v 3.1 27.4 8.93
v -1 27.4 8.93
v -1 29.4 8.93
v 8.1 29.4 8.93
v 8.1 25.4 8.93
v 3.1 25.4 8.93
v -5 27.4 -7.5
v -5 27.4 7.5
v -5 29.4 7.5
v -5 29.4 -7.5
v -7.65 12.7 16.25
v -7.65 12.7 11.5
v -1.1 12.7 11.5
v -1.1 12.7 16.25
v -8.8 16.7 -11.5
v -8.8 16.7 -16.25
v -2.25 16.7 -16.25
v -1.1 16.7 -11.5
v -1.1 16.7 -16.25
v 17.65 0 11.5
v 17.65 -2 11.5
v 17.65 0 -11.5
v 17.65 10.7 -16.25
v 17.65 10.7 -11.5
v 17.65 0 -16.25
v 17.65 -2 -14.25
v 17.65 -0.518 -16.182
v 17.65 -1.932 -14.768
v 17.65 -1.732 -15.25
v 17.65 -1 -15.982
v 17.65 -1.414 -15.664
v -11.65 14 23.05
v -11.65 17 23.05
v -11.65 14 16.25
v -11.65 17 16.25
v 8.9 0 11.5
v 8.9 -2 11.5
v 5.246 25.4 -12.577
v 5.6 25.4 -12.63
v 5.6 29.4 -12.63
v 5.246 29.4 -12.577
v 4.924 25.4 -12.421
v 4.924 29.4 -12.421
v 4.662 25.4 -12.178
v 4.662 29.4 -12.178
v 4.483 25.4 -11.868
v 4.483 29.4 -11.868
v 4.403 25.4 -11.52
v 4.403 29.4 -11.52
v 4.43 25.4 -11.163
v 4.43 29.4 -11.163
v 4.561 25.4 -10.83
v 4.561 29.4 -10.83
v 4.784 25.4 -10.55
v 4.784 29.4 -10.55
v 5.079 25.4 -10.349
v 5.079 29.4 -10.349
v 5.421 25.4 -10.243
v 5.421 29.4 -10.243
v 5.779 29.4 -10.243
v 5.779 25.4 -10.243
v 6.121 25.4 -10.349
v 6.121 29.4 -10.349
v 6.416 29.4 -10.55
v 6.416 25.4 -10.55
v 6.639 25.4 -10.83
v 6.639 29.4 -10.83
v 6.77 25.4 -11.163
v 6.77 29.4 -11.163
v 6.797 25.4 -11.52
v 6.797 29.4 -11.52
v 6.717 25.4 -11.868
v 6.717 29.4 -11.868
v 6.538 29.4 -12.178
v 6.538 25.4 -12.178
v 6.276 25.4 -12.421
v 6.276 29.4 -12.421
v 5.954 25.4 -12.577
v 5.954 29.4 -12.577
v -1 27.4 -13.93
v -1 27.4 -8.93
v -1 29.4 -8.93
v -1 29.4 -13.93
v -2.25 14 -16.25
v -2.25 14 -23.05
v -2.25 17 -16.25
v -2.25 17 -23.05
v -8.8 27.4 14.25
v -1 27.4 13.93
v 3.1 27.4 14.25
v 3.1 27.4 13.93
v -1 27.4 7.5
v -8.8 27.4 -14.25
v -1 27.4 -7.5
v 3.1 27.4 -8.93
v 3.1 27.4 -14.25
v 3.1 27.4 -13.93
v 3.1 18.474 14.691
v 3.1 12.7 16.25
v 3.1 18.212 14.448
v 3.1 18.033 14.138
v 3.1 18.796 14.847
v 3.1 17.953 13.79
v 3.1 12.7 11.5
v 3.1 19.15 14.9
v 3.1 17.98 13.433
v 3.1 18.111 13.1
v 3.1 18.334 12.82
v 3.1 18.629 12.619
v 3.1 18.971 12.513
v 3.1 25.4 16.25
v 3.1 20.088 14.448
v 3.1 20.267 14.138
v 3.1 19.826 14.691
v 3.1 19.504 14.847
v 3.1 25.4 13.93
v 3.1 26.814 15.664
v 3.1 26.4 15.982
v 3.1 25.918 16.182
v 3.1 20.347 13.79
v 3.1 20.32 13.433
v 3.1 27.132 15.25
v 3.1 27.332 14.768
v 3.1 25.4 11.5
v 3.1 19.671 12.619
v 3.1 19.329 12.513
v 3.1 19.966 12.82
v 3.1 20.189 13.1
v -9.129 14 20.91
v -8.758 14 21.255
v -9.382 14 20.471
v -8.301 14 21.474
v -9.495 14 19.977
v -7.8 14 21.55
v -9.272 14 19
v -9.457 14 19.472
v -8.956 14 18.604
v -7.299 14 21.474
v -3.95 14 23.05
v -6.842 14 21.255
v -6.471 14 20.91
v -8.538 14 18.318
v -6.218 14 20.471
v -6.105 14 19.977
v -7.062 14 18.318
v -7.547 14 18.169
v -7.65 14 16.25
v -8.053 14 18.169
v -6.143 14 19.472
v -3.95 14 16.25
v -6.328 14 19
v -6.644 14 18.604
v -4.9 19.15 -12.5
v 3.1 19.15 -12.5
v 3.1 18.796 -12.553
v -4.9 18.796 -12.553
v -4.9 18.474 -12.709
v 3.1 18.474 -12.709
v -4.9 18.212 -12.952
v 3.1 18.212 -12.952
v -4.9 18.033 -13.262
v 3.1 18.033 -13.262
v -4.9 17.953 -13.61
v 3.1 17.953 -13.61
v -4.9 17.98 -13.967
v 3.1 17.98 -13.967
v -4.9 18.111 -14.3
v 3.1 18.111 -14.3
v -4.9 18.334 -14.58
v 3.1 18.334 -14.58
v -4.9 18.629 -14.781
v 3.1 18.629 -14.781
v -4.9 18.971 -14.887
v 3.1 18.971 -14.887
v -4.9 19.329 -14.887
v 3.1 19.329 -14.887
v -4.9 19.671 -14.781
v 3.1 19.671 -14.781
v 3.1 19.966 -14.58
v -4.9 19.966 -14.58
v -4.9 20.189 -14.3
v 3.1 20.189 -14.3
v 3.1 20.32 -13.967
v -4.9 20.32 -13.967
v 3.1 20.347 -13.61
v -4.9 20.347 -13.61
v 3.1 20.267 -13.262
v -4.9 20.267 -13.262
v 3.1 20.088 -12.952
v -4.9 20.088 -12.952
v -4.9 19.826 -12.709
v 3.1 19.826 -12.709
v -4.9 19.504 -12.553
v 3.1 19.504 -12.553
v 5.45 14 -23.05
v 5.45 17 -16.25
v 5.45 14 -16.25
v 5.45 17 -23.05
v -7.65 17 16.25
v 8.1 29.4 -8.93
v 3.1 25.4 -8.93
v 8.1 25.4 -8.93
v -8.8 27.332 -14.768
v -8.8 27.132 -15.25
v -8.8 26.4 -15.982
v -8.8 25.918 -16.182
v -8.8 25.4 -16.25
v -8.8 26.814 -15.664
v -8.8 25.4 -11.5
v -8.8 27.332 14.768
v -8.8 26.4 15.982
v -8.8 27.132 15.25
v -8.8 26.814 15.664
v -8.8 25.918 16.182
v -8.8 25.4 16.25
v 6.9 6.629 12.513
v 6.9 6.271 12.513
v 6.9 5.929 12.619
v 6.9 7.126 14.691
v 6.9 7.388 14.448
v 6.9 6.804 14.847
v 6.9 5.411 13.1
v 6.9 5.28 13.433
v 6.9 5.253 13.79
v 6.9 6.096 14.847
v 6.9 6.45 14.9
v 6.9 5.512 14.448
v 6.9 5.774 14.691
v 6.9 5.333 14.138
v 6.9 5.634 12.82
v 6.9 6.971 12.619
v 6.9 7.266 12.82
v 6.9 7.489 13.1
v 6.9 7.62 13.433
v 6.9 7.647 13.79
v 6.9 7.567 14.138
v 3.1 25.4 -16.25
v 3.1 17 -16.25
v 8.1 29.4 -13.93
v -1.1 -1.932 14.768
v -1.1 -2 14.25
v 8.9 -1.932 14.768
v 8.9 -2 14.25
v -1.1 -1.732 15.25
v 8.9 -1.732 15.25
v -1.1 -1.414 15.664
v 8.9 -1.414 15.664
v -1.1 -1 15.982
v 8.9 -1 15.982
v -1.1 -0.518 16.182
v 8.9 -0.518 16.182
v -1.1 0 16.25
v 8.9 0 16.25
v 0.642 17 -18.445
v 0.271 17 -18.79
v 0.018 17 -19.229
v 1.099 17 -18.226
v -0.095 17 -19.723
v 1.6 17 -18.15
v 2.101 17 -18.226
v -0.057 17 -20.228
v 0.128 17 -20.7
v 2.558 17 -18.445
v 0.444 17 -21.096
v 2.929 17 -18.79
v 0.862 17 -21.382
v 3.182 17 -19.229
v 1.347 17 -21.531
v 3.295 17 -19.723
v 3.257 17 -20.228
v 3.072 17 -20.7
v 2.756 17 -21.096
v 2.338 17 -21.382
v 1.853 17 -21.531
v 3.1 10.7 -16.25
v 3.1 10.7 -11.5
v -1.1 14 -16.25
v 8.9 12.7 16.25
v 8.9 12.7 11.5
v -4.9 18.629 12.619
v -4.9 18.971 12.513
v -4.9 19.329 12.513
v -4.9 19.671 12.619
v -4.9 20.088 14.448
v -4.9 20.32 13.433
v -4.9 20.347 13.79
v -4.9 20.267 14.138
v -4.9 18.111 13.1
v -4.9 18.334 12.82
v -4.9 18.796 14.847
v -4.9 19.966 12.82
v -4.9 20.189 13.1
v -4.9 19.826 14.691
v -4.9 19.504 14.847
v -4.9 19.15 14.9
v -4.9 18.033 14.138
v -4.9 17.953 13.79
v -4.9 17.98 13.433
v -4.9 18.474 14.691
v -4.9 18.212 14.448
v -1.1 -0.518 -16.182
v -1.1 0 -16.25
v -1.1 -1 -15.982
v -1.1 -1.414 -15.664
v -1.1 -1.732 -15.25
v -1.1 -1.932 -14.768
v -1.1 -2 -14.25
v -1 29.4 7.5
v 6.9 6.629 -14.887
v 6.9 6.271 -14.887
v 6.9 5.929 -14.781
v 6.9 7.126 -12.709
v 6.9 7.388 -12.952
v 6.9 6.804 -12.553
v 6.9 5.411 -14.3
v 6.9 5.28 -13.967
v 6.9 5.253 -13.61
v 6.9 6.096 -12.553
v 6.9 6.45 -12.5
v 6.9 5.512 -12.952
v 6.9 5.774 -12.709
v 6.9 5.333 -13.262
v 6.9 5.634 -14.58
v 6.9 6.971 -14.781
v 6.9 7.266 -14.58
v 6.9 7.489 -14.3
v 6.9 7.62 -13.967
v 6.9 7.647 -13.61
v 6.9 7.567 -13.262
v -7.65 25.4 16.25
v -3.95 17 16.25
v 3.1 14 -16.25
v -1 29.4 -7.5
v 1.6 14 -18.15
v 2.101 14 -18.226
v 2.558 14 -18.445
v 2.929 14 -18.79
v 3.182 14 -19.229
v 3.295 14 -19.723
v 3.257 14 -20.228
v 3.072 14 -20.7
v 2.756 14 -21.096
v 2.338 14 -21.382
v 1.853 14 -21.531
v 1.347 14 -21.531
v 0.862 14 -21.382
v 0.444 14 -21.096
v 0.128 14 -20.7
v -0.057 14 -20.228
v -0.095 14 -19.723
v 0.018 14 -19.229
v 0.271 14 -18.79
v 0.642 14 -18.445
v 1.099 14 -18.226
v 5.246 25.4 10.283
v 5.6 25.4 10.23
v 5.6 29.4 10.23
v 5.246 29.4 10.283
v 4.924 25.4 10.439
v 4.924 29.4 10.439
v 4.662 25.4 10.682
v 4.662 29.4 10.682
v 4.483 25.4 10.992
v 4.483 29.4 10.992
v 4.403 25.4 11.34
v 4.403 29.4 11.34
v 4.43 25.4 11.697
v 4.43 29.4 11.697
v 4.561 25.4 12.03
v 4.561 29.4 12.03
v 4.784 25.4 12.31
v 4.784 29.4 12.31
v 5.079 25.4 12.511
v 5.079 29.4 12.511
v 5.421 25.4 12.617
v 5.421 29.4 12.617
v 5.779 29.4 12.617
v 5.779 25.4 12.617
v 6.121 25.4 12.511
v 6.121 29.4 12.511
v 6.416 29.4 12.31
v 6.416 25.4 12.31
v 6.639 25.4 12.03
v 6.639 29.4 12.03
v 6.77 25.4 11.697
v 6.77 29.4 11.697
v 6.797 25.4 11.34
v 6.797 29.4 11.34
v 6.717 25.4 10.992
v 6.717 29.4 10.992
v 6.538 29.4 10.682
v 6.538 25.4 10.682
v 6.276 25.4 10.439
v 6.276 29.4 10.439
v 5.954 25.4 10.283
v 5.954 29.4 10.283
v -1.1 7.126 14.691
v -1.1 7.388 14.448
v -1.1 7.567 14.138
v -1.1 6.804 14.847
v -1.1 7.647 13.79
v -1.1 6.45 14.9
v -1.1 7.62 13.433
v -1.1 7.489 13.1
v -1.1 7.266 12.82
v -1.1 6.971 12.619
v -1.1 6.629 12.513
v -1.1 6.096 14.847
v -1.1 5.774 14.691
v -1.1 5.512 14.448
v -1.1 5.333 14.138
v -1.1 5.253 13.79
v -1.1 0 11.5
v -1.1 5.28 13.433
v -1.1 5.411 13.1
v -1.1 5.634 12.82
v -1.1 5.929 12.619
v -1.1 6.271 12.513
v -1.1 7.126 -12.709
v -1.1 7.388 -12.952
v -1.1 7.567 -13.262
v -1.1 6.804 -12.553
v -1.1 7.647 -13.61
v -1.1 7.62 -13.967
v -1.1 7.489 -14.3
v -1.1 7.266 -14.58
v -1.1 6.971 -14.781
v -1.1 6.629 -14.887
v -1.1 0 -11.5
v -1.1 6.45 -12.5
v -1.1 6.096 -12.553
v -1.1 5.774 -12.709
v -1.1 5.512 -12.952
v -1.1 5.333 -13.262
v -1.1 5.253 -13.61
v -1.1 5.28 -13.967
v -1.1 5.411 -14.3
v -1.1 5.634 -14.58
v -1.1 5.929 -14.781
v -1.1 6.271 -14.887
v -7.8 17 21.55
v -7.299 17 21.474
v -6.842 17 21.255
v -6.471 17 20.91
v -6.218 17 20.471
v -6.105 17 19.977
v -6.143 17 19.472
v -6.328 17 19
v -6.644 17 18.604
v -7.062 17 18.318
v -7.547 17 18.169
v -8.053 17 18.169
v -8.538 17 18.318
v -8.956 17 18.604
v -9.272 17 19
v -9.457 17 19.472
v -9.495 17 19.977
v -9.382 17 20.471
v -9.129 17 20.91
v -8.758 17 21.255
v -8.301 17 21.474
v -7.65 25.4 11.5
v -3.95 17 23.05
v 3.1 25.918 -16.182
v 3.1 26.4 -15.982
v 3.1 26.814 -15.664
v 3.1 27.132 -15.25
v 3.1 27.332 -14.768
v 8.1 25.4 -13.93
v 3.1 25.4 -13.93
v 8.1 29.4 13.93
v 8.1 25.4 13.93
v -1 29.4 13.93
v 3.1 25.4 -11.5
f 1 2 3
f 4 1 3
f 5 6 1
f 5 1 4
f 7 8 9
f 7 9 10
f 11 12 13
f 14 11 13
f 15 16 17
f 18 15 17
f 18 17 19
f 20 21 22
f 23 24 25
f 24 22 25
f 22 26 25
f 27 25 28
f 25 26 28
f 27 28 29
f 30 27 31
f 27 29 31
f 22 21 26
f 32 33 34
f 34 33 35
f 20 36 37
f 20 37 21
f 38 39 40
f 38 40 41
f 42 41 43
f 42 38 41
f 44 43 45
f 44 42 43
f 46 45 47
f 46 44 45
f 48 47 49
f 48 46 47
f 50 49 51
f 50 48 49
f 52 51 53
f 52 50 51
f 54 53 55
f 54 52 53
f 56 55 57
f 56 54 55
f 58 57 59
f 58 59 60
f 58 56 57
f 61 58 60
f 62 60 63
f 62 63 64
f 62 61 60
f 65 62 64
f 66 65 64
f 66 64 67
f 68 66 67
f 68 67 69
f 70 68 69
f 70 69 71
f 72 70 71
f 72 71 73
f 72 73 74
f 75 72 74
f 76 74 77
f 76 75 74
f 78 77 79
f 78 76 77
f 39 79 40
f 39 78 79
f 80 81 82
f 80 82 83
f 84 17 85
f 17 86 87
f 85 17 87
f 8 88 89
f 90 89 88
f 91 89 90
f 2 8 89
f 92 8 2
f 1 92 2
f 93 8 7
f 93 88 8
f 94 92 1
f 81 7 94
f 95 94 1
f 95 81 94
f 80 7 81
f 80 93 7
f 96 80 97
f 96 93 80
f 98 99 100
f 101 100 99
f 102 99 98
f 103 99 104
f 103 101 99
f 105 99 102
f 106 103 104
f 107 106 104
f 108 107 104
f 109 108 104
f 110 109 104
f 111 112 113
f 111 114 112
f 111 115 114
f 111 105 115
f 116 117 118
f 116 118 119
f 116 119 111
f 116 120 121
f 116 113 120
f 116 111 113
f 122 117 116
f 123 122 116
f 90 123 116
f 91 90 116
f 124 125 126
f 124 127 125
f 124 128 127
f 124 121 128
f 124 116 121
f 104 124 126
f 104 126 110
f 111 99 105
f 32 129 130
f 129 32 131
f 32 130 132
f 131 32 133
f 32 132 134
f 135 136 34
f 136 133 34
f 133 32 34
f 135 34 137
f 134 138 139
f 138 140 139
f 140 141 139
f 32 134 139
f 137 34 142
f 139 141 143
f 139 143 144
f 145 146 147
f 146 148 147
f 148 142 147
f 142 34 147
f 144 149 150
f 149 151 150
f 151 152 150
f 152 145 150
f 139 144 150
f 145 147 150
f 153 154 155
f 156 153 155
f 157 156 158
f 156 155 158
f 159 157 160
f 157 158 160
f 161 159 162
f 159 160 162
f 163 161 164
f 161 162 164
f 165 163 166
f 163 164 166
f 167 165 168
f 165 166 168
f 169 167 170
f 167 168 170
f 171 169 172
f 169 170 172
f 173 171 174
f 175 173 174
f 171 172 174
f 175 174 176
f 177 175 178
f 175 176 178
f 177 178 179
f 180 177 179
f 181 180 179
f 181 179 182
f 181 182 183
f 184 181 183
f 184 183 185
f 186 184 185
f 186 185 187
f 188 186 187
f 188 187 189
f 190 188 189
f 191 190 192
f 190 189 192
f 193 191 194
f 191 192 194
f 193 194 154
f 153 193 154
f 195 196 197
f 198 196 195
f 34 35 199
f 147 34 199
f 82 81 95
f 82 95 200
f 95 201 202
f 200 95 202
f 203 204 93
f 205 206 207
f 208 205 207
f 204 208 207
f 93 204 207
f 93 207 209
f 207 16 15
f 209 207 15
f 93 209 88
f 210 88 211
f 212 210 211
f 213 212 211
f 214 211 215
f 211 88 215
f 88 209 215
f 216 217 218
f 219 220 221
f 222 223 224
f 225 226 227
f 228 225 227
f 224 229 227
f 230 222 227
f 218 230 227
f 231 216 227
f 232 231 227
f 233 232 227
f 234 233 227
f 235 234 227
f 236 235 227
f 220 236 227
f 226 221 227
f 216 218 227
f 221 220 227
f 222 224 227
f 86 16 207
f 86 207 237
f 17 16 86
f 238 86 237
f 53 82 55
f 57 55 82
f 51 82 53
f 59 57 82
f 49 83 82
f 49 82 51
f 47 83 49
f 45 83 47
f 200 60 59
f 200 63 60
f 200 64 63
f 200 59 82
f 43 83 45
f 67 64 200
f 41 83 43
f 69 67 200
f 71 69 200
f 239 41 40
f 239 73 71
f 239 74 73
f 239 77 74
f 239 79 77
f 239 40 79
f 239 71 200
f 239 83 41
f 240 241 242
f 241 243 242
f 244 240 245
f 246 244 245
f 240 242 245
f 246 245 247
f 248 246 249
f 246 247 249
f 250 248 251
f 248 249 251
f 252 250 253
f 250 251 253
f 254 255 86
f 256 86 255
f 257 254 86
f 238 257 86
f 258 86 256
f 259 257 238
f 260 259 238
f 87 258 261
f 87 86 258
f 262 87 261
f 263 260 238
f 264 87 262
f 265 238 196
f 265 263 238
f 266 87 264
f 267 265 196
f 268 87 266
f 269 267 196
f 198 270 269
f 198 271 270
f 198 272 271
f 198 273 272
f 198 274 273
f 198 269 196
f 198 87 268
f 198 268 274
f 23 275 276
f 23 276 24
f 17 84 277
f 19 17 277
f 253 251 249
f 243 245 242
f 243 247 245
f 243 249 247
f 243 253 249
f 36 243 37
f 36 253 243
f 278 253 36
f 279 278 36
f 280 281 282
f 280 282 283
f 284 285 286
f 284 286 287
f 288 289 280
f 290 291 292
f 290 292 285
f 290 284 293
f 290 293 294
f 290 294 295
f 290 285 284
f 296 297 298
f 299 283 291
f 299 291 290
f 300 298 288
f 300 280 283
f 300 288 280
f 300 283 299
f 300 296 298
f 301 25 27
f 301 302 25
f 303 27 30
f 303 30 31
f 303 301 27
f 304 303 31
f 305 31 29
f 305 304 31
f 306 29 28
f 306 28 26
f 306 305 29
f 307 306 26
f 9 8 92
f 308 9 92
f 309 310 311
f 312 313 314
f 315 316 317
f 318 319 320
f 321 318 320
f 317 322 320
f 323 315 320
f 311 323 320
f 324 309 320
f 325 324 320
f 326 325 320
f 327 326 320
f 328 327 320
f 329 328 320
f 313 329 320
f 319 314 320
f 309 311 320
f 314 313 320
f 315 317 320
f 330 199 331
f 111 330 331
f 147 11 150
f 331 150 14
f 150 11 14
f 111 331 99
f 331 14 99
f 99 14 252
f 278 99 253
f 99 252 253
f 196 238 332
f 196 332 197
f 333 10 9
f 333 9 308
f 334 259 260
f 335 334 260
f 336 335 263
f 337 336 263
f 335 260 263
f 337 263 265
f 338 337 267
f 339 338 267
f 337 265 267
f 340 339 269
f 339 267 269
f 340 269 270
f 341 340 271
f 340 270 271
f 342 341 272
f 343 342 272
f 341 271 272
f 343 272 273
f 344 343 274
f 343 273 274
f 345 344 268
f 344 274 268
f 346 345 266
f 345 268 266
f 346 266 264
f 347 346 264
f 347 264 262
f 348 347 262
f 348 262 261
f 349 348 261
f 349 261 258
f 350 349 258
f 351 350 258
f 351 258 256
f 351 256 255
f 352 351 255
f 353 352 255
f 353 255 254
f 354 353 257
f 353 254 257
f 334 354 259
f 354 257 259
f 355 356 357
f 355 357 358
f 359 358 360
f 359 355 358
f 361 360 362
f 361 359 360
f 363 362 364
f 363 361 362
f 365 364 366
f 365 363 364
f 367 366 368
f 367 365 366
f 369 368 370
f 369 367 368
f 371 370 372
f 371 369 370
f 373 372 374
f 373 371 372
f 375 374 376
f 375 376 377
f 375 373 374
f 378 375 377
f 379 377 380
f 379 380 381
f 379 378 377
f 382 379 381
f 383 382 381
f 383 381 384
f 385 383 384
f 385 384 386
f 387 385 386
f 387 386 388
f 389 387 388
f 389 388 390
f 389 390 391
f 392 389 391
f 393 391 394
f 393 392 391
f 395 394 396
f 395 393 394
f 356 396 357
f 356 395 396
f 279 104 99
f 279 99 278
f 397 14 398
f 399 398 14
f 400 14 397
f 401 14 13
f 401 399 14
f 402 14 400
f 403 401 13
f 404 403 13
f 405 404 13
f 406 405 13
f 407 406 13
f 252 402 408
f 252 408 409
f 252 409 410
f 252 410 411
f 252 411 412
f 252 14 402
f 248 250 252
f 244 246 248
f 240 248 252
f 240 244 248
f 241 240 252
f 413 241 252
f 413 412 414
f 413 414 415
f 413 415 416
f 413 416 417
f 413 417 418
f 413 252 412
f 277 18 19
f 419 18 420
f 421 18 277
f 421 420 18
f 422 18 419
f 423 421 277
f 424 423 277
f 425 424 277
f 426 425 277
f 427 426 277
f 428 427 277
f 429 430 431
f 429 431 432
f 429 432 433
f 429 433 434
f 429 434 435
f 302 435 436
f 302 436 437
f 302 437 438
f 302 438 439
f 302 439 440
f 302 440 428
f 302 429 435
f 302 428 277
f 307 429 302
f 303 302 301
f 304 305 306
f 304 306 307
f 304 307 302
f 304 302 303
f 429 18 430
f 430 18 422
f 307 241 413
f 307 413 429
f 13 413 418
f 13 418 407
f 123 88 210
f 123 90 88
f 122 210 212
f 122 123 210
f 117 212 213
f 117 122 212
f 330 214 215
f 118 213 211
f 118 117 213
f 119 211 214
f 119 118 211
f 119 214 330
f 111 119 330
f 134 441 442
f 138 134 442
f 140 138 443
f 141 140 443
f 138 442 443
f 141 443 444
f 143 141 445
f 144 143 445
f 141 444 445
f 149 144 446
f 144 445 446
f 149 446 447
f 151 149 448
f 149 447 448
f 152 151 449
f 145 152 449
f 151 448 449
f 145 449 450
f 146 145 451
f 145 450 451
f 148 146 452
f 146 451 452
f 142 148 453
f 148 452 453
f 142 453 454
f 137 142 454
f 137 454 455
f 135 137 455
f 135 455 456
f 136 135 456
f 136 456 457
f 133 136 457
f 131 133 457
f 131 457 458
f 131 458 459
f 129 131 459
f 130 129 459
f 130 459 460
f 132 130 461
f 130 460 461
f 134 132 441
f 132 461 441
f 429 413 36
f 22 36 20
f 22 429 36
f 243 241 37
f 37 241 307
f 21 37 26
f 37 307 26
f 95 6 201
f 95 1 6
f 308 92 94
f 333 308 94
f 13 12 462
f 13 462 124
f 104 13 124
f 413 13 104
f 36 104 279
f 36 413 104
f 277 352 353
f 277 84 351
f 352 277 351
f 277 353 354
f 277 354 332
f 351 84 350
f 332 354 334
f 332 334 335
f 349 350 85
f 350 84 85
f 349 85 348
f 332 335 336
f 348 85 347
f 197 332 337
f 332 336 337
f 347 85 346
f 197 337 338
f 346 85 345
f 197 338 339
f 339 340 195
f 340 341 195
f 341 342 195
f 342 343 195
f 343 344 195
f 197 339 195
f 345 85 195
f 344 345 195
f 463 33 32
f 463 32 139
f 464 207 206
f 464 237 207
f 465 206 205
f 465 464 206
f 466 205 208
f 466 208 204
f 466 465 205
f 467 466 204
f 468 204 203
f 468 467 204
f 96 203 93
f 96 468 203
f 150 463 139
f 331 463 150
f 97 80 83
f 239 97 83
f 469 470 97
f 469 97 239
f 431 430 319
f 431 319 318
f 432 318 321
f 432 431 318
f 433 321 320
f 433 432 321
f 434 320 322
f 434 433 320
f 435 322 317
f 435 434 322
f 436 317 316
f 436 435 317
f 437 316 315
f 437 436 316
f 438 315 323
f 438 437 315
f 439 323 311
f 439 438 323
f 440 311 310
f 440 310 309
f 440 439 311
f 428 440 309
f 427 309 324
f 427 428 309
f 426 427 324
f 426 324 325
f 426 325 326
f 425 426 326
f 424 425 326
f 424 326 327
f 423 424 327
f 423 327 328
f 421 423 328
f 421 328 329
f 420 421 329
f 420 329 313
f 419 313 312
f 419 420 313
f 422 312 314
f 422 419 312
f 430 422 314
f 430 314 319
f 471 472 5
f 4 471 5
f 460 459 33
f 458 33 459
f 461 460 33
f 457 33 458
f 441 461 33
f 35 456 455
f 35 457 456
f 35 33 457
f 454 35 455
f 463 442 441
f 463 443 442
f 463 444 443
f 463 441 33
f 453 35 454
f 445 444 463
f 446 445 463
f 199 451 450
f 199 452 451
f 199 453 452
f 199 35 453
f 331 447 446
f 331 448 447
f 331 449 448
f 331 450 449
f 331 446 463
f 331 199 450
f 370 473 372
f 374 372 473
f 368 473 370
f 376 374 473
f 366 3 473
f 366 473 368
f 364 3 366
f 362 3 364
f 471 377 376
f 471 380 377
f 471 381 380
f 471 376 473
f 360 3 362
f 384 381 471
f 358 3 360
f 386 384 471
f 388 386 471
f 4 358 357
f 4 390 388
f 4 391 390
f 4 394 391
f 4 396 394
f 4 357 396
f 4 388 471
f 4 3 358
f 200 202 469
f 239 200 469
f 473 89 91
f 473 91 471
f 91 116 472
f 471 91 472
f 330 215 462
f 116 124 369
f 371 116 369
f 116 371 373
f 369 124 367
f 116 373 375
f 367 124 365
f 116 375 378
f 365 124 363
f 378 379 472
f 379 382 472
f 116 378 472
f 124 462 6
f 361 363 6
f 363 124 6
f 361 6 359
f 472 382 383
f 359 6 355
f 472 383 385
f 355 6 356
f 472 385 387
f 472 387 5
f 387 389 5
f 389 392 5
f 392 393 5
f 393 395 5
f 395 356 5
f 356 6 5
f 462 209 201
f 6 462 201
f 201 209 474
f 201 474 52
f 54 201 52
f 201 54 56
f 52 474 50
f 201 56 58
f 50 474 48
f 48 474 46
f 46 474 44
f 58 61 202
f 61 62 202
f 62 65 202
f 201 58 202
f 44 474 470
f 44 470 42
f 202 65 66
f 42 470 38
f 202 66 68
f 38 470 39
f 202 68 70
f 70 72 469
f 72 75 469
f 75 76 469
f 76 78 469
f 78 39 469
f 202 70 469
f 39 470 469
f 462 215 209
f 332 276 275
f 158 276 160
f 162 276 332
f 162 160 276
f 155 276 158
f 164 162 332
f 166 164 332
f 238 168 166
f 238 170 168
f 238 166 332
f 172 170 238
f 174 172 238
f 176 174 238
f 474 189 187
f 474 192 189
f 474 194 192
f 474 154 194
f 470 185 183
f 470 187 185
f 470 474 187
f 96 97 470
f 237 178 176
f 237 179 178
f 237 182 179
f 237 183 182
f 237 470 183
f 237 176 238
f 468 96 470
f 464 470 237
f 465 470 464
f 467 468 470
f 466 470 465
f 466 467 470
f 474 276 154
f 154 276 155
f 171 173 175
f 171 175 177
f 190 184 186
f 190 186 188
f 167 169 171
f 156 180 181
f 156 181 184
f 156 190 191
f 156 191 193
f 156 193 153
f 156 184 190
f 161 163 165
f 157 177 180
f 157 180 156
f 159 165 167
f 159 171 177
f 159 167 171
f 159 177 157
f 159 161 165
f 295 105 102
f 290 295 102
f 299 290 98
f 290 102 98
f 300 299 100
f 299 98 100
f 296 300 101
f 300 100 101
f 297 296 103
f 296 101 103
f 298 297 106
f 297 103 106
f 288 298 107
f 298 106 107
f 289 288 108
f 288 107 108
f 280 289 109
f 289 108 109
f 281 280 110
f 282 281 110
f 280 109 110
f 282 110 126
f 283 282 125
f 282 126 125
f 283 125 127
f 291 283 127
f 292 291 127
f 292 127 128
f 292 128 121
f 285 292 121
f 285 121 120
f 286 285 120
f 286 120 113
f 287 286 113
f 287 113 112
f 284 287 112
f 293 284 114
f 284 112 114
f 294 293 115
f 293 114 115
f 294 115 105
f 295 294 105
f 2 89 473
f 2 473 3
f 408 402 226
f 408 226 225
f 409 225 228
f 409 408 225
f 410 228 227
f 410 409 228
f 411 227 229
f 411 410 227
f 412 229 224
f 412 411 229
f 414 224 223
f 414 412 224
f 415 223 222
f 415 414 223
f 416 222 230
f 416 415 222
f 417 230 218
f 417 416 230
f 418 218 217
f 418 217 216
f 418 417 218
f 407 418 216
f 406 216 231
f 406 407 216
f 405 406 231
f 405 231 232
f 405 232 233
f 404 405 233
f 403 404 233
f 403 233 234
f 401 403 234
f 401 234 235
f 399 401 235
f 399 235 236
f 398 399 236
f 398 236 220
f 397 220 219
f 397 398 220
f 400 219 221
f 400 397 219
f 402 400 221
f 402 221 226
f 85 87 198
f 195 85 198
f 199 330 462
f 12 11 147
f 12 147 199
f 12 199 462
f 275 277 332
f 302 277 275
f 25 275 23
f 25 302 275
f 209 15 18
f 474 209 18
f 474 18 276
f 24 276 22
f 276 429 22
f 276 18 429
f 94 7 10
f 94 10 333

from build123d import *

# Parameters (mm, degrees)
BOSS_EXTRUDE1_DEPTH      = 2
SKETCH1_3_W              = 10
SKETCH1_3_H              = 4.75
BOSS_EXTRUDE2_DEPTH      = 12.7
BOSS_EXTRUDE3_START      = 12.7
SKETCH3_W                = 11.9
SKETCH3_H                = 4.75
SKETCH3_W_2              = 10.75
BOSS_EXTRUDE3_DEPTH      = 12.7
BOSS_EXTRUDE4_START      = 25.4
SKETCH3_3_W              = 11.9
SKETCH3_3_H              = 4.75
SKETCH3_3_W_2            = 10.75
SKETCH3_3_W_3            = 1.15
BOSS_EXTRUDE4_DEPTH      = 2
CUT_EXTRUDE1_START       = -1.1
SKETCH2_R                = 1.2
CUT_EXTRUDE1_DEPTH       = 8
CUT_EXTRUDE2_START       = 3.1
SKETCH2_3_R              = 1.2
CUT_EXTRUDE2_DEPTH       = 8
BOSS_EXTRUDE5_START      = 17
SKETCH1_4_W              = 7.7
SKETCH1_4_H              = 6.8
SKETCH1_4_R              = 1.7
BOSS_EXTRUDE5_DEPTH      = 3
FILLET1_R                = 2
CUT_EXTRUDE3_START       = 12.7
SKETCH5_W                = 14.55
SKETCH5_H                = 4.75
CUT_EXTRUDE3_DEPTH       = 2
CUT_EXTRUDE4_START       = 12.7
SKETCH6_W                = 7.7
SKETCH6_H                = 4.75
CUT_EXTRUDE4_DEPTH       = 4
BOSS_EXTRUDE6_DEPTH      = 2
BOSS_EXTRUDE6_DEPTH_BACK = 2
BOSS_EXTRUDE6_START      = 27.4
SKETCH7_W                = 9.1
SKETCH7_H                = 5
SKETCH7_R                = 1.2
SKETCH7_W_2              = 4
SKETCH7_H_2              = 15


with BuildPart() as part:
    # Sketch1 → Boss-Extrude1 (new body)
    with BuildSketch(Plane(origin=(0, 0, 0), x_dir=(1, 0, 0), z_dir=(0, 1, 0))):
        Polygon((-1.1, 16.25), (-1.1, -16.25), (8.9, -16.25), (8.9, -11.5), (17.65, -11.5), (17.65, 16.25), align=None)
    extrude(amount=-BOSS_EXTRUDE1_DEPTH)

    # Sketch1<3> → Boss-Extrude2 (add)
    with BuildSketch(Plane(origin=(0, 0, 0), x_dir=(1, 0, 0), z_dir=(0, 1, 0))):
        Polygon((5.45, 16.25), (-1.1, 16.25), (-1.1, 11.5), (17.65, 11.5), (17.65, 16.25), align=None)
        with Locations((3.9, -13.875)):
            Rectangle(SKETCH1_3_W, SKETCH1_3_H)
    extrude(amount=BOSS_EXTRUDE2_DEPTH)

    # Sketch3 → Boss-Extrude3 (add)
    with BuildSketch(Plane(origin=(0, 0, 0), x_dir=(1, 0, 0), z_dir=(0, 1, 0)).offset(BOSS_EXTRUDE3_START)):
        with Locations((-2.85, 13.875)):
            Rectangle(SKETCH3_W, SKETCH3_H)
        with Locations((-2.275, -13.875)):
            Rectangle(SKETCH3_W_2, SKETCH3_H)
    extrude(amount=BOSS_EXTRUDE3_DEPTH)

    # Sketch3<3> → Boss-Extrude4 (add)
    with BuildSketch(Plane(origin=(0, 0, 0), x_dir=(1, 0, 0), z_dir=(0, 1, 0)).offset(BOSS_EXTRUDE4_START)):
        with Locations((-2.85, 13.875)):
            Rectangle(SKETCH3_3_W, SKETCH3_3_H)
        Polygon((3.1, -11.5), (3.1, 11.5), (-8.8, 11.5), (-8.8, -11.5), (-7.65, -11.5), align=None)
        with Locations((-2.275, -13.875)):
            Rectangle(SKETCH3_3_W_2, SKETCH3_3_H)
        with Locations((-8.225, -13.875)):
            Rectangle(SKETCH3_3_W_3, SKETCH3_3_H)
    extrude(amount=BOSS_EXTRUDE4_DEPTH)

    # Sketch2 → Cut-Extrude1 (cut)
    with BuildSketch(Plane(origin=(0, 0, 0), x_dir=(0, 0, -1), z_dir=(1, 0, 0)).offset(CUT_EXTRUDE1_START)):
        with Locations(Location((-13.7, 6.45, 0), (0, 0, 180))):
            Circle(SKETCH2_R)
        with Locations(Location((13.7, 6.45, 0), (0, 0, 180))):
            Circle(SKETCH2_R)
    extrude(amount=CUT_EXTRUDE1_DEPTH, mode=Mode.SUBTRACT)

    # Sketch2<3> → Cut-Extrude2 (cut)
    with BuildSketch(Plane(origin=(0, 0, 0), x_dir=(0, 0, -1), z_dir=(1, 0, 0)).offset(CUT_EXTRUDE2_START)):
        with Locations(Location((13.7, 19.15, 0), (0, 0, 180))):
            Circle(SKETCH2_3_R)
        with Locations(Location((-13.7, 19.15, 0), (0, 0, 180))):
            Circle(SKETCH2_3_R)
    extrude(amount=-CUT_EXTRUDE2_DEPTH, mode=Mode.SUBTRACT)

    # Sketch1<4> → Boss-Extrude5 (add)
    # profile 1 of 2: a face of its own
    with BuildSketch(Plane(origin=(0, 0, 0), x_dir=(1, 0, 0), z_dir=(0, 1, 0)).offset(BOSS_EXTRUDE5_START)):
        with Locations((1.6, 19.65)):
            Rectangle(SKETCH1_4_W, SKETCH1_4_H)
        with Locations(Location((1.6, 19.85, 0), (0, 0, 270))):
            Circle(SKETCH1_4_R, mode=Mode.SUBTRACT)
    # profile 2 of 2: a face of its own
    with BuildSketch(Plane(origin=(0, 0, 0), x_dir=(1, 0, 0), z_dir=(0, 1, 0)).offset(BOSS_EXTRUDE5_START)):
        with Locations((-7.8, -19.65)):
            Rectangle(SKETCH1_4_W, SKETCH1_4_H)
        with Locations(Location((-7.8, -19.85, 0), (0, 0, 270))):
            Circle(SKETCH1_4_R, mode=Mode.SUBTRACT)
    extrude(amount=-BOSS_EXTRUDE5_DEPTH)

    # Fillet1
    fillet1_edges = [part.edges().sort_by_distance(p)[0] for p in [
        (3.9, -2, 16.25),
        (-2.85, 27.4, 16.25),
        (8.275, -2, -16.25),
        (-2.85, 27.4, -16.25),
    ]]
    fillet(fillet1_edges, radius=FILLET1_R)

    # Sketch5 → Cut-Extrude3 (cut)
    with BuildSketch(Plane(origin=(0, 0, 0), x_dir=(1, 0, 0), z_dir=(0, 1, 0)).offset(CUT_EXTRUDE3_START)):
        with Locations((10.375, 13.875)):
            Rectangle(SKETCH5_W, SKETCH5_H)
    extrude(amount=-CUT_EXTRUDE3_DEPTH, mode=Mode.SUBTRACT)

    # Sketch6 → Cut-Extrude4 (cut)
    with BuildSketch(Plane(origin=(0, 0, 0), x_dir=(1, 0, 0), z_dir=(0, 1, 0)).offset(CUT_EXTRUDE4_START)):
        with Locations((-4.95, 13.875)):
            Rectangle(SKETCH6_W, SKETCH6_H)
    extrude(amount=CUT_EXTRUDE4_DEPTH, mode=Mode.SUBTRACT)

    # Sketch7 → Boss-Extrude6 (add, two sides: drawn at the far end of the back side and taken through both)
    # profile 1 of 3: a face of its own
    with BuildSketch(Plane(origin=(0, 0, 0), x_dir=(1, 0, 0), z_dir=(0, 1, 0)).offset(BOSS_EXTRUDE6_START - BOSS_EXTRUDE6_DEPTH_BACK)):
        with Locations((3.55, 11.43)):
            Rectangle(SKETCH7_W, SKETCH7_H)
        with Locations(Location((5.6, 11.43, 0), (0, 0, 90))):
            Circle(SKETCH7_R, mode=Mode.SUBTRACT)
    # profile 2 of 3: a face of its own
    with BuildSketch(Plane(origin=(0, 0, 0), x_dir=(1, 0, 0), z_dir=(0, 1, 0)).offset(BOSS_EXTRUDE6_START - BOSS_EXTRUDE6_DEPTH_BACK)):
        with Locations((-3, 0)):
            Rectangle(SKETCH7_W_2, SKETCH7_H_2)
    # profile 3 of 3: a face of its own
    with BuildSketch(Plane(origin=(0, 0, 0), x_dir=(1, 0, 0), z_dir=(0, 1, 0)).offset(BOSS_EXTRUDE6_START - BOSS_EXTRUDE6_DEPTH_BACK)):
        with Locations((3.55, -11.43)):
            Rectangle(SKETCH7_W, SKETCH7_H)
        with Locations(Location((5.6, -11.43, 0), (0, 0, 90))):
            Circle(SKETCH7_R, mode=Mode.SUBTRACT)
    extrude(amount=BOSS_EXTRUDE6_DEPTH + BOSS_EXTRUDE6_DEPTH_BACK)


solid = part.part
